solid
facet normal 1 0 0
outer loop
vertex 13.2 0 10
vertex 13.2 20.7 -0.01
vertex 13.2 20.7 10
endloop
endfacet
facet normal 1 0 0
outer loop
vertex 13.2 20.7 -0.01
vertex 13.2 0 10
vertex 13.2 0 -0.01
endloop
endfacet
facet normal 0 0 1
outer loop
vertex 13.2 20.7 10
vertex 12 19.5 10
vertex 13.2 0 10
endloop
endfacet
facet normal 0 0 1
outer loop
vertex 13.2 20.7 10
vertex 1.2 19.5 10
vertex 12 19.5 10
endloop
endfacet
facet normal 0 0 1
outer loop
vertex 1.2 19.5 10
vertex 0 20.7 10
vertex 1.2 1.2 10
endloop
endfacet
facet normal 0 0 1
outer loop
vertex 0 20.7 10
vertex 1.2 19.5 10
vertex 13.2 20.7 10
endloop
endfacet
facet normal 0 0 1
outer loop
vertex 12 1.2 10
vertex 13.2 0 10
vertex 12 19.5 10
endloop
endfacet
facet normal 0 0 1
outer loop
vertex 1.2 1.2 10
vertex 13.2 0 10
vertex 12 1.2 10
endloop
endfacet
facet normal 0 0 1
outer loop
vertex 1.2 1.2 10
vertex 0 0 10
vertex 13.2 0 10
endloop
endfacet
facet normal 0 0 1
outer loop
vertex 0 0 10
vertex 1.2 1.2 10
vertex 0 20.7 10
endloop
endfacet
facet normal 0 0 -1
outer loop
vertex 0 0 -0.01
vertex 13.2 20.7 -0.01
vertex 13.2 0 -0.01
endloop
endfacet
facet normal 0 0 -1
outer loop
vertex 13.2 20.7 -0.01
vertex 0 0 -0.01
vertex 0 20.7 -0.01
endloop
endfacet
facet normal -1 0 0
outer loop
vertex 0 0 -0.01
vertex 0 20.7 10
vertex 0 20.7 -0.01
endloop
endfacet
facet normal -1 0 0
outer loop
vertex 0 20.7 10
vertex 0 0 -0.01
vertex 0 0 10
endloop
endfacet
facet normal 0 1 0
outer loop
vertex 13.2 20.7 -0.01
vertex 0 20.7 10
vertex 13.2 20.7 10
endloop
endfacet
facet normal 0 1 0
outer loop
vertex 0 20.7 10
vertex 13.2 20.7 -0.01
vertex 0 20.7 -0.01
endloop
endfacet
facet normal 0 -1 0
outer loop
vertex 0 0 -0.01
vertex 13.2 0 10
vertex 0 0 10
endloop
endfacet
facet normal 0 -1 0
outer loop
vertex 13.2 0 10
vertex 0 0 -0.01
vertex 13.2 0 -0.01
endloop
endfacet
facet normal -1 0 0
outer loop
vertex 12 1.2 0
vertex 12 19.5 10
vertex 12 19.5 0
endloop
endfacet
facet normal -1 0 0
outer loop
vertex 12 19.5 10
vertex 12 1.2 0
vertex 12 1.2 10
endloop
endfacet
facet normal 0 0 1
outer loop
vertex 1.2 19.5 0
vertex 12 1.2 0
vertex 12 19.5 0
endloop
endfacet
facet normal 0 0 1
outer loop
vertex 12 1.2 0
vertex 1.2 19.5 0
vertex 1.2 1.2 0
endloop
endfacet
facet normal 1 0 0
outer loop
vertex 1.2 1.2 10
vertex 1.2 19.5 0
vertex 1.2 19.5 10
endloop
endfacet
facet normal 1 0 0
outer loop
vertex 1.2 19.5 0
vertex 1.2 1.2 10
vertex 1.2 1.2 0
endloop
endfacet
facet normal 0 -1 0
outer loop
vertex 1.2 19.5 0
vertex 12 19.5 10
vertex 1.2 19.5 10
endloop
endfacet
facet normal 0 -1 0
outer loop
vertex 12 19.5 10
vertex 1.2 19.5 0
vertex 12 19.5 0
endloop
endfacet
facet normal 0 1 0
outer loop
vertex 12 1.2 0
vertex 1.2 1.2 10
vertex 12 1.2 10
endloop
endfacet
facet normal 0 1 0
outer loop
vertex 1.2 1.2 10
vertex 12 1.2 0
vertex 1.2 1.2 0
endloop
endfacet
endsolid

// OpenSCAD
// file: ../Base/Boxes.scad
// Fischertechnik Box Foundation
// Pre-designed Boxes

use <Constants.scad>

include <PlacementOptions.scad>

box190Width = 190;
box190Depth = 130;
box130Width = 130;
box130Depth = 95;

// Values are from an original ec3 box
topBottomDifference = 1.5;
outerHeight = 40;
innerHeight = 38.2;
baseThickness = outerHeight - innerHeight;
stackExcess = 5.7;
radius = 3.5;
wallThickness = 1.5;
tolerance = 0.2;
stackOffset = innerHeight - stackExcess;

boxUsageHeight = stackOffset;
boxWallThickness = wallThickness;
boxBaseThickness = baseThickness;
boxWebWidth = 3.0;

// getBoxWallThickness()
// Gets the wall thickness of a Fischertechnik Box
function getBoxWallThickness() = boxWallThickness;

// getBoxUsageHeight()
// Gets the usable height of a Fischertechnik box
function getBoxUsageHeight() = boxUsageHeight;

// getBoxInnerHeight()
// Gets the inner height of a Fischertechnik box, including the stack excess
function getBoxInnerHeight() = innerHeight;

// getBoxBaseThickness()
// Gets the thickness of the Fischertechnik box base.
function getBoxBaseThickness() = boxBaseThickness;

// getBoxWebWidth()
// Gets the width of a box web
function getBoxWebWidth() = boxWebWidth;

// getBox190Space()
// Gets the usable inner space of a Box 190 as an x/y-list
function getBox190Space() = [
    box190Width - 2*getBoxWallThickness() - topBottomDifference, 
    box190Depth - 2*getBoxWallThickness() - topBottomDifference ];

// BoxBase(width, depth)
// Creates an empty stackable Fischertechnik compatible box
// width = Outer width of the box (190, 130, ...)
// depth = Outer depth of the box (130, 95, ...)

module BoxBase(width, depth, height=outerHeight) {    
    thinPlate = 0.01;

    innerHeight = height - baseThickness;    
    
    module BodyPlate(width, depth) {
        translate([radius, radius])
        hull() {
            w = width-2*radius;
            d = depth-2*radius;
            cube([w, d, thinPlate]);
            cylinder(thinPlate, r=radius, $fn=getFragments());
            translate([w, 0])
                cylinder(thinPlate, r=radius, $fn=getFragments());
            translate([w, d])
                cylinder(thinPlate, r=radius, $fn=getFragments());
            translate([0, d])
                cylinder(thinPlate, r=radius, $fn=getFragments());
        }
    }
    
    module Body(tolerance=tolerance) {
        hull() {
            // Bottom with tolerance to fit into the original boxes when stacked
            translate([-wallThickness+tolerance, -wallThickness+tolerance, -baseThickness])
                BodyPlate(width-topBottomDifference-2*tolerance, depth-topBottomDifference-2*tolerance);
            
            // Top
            translate([-wallThickness-topBottomDifference/2, -wallThickness-topBottomDifference/2, innerHeight-thinPlate])
                BodyPlate(width, depth);
         }
    }

    module Cutoff() {
        hull() {
            coWidth = width - 2*wallThickness;
            coDepth = depth - 2*wallThickness;
            
            // Bottom
            BodyPlate(coWidth-topBottomDifference, coDepth-topBottomDifference);

            // Top
            translate([-topBottomDifference/2, -topBottomDifference/2, innerHeight+thinPlate]) 
                BodyPlate(coWidth, coDepth);
        }
    }
    
    difference() {        
        Body();
        Cutoff();
        stackOffset = innerHeight - stackExcess;
        translate([0, 0, stackOffset + baseThickness])
            Body(tolerance=0);
    }
}

// Creates the Fischertechnik empty box 130x190 mm and places it at position 0,0
// 190x130 are the outer sizes, the inner space is slightly smaller. Use getBox190Space() to get the inner sizes.
// The box is positioned that the usable inner space is at the 0,0,0 position. The

module Box190() {
    BoxBase(box190Width, box190Depth);
}

// Gets the usable inner space of a Box 130 as an x/y-list
function getBox130Space() = [
    box130Width - 2*getBoxWallThickness() - topBottomDifference, 
    box130Depth - 2*getBoxWallThickness() - topBottomDifference ];

// Creates the Fischertechnik empty box 95x130 mm and places it at position 0,0
// 190x130 are the outer sizes, the inner space is slightly smaller. Use getBox190Space() to get the inner sizes.
// The box is positioned that the usable inner space is at the 0,0,0 position. The

module Box130() {
    BoxBase(box130Width, box130Depth);
}

// Creates a web at the specified box walls
// corner 0 = LowerLeft, 1 = UpperLeft, 2 = UpperRight, 3 = LowerRight
// side 0 = LeftOfCorner, 1 = RightOfCorner
// distance = Distance in mm from the corner
// boxSpace = inner width and depth of the box (default: Box 190)
// webWidth = length of the web (default is 3 mms)
// webThickness = thickness of the web (default is 1 mm)

module BoxWeb(corner, side, distance, boxSpace=getBox190Space(), webWidth=getBoxWebWidth(), webThickness=1.0) {
    sink = getBoxWallThickness()/2;

    width = (corner % 2 == 0) ? 
            (side == LeftOfCorner ? webWidth : webThickness) :
            (side == LeftOfCorner ? webThickness : webWidth);

    depth = (corner % 2 == 0) ? 
            (side == RightOfCorner ? webWidth : webThickness) :
            (side == RightOfCorner ? webThickness : webWidth);
    
    xDiff = corner == LowerLeft ? 
                (side == LeftOfCorner ? -sink : distance) :
            (corner == UpperLeft ?                
                (side == LeftOfCorner ? distance : -sink) :
            (corner == UpperRight ?
                (side == LeftOfCorner ? boxSpace.x-webWidth+sink : boxSpace.x-distance-webThickness) :
                (side == LeftOfCorner ? boxSpace.x-distance-webThickness: boxSpace.x-webWidth+sink)));

    yDiff = corner == LowerLeft ? 
                (side == RightOfCorner ? -sink : distance) :
            (corner == UpperLeft ?
                (side == RightOfCorner ? boxSpace.y-distance : boxSpace.y-webWidth+sink) :
            (corner == UpperRight ?
                (side == RightOfCorner ? boxSpace.y-webWidth+sink : boxSpace.y-distance) :
                (side == RightOfCorner ? distance : -sink)));
    
    translate([xDiff, yDiff, -getExcess()])
        cube([width, depth, boxUsageHeight + 2*getExcess()]);
}
// file: ../Base/Rotation.scad
// Fischertechnik Box Foundation
// Geometry Helpers Rotation

include <PlacementOptions.scad>

// getRotatedSpace(space, rotation=NoRotation)
// Rotates the space dependent on the specified rotation

function getRotatedSpace(space, rotation=NoRotation) = [
    (rotation == Rotate90 || rotation == Rotate270) ? space.y : space.x,
    (rotation == Rotate90 || rotation == Rotate270) ? space.x : space.y
];

// Rotates the given space around the fixed left lower corner
// space = the space the children needs as width/depth list [width,depth]
// rotation = 0 Rotate0 degrees, 1 Rotate90 degrees, 2 Rotate180 degrees, 3 Rotate270 degrees (equivalent to -90)

module RotateFix(space, rotation=NoRotation) {
    dy = (rotation == Rotate0 || rotation == Rotate270) ? 0 :
        (rotation == Rotate90) ? space.x :
        space.y;
    dx = (rotation < Rotate180) ? 0 :
        (rotation == Rotate180) ? space.x :
        space.y;
    
    translate([dx, dy, 0])
        rotate([0, 0, rotations[rotation]])
            children();
}
// file: ../Base/Alignment.scad
// Fischertechnik Box Foundation
// Geometry Helpers Alignment

include <PlacementOptions.scad>

// getAlignedX(elementWidth, spaceWidth, align=AlignRight, offset=0)
// Gets the aligned X offset of an element with the given
// width in the given space.
// elementWidth = The width of the element to positon
// spaceWidth = The space where the element should be aligned
// align = 0 AlignLeft, 1 AlignCenter, 2 AlignRight
// offset = an optional offset from the aligned position. When
// aligned left or centered, then positive values are in X direction.
// When aligned right then positive values are in negative X direction.

function getAlignedX(elementWidth, spaceWidth, align=AlignRight, offset=0) =
    (align == AlignLeft) ?
        offset :
        ((align == AlignCenter) ?
        (spaceWidth - elementWidth)/2 + offset :
        spaceWidth - offset - elementWidth);

// getAlignedY(elementDepth, spaceDepth, align=AlignTop, offset=0)
// Gets the aligned Y offset of an element with the given
// depth in the given space.
// elementDepth = The depth of the element to positon
// spaceDepth = The space where the element should be aligned
// align = 0 AlignBottom, 1 AlignCenter, 2 AlignTop
// offset = an optional offset from the aligned position. When
// aligned bottom or centered, then positive values are in Y direction.
// When aligned top then positive values are in negative Y direction.

function getAlignedY(elementDepth, spaceDepth, align=AlignTop, offset=0) =
    (align == AlignBottom) ?
        offset :
        ((align == AlignCenter) ?
        (spaceDepth - elementDepth)/2 + offset :
        spaceDepth - offset - elementDepth);
// file: ../Base/Placement.scad
// Fischertechnik Box Foundation
// Geometry Helpers Placement

use <Constants.scad>
use <Alignment.scad>
use <Rotation.scad>
use <Boxes.scad>

include <PlacementOptions.scad>

// Place(x=0, y=0, elementSpace=[0,0], alignX=AlignLeft, alignY=AlignBottom, rotation=Rotate0, boxSpace=getBox190Space())
// Places the child at the specified position
// y = Y-Position. This is a relative position when an X aligment is specified.
// x = X-Position. This is a relative position when an Y aligment is specified.
// elementSpace = space of the element to be placed [x,y]
// alignX = -1=NoAlign, 0 AlignLeft, 1 AlignCenter, 3 AlignRight (elementSpace and boxSpace required!)
// alignY = -1=NoAlign, 2 AlignBottom, 1 AlignCenter, 4 AlignTop (elementSpace and boxSpace required!)
// rotation = 0 Rotate0 0 degrees, 1 Rotate90 90 degrees, 
// 2 Rotate180 180 degrees, 3 Rotate270 270 degrees (equivalent to -90)
// boxSpace = Inner space of the box where the placement occurs [x,y] - default is Box 190x130 inner space

module Place(x=0, y=0, elementSpace=[0,0], 
  alignX=AlignLeft, alignY=AlignBottom, 
  rotation=NoRotation, boxSpace=getBox190Space()) {

    module Position(x, y, space, rotation=Rotate0) {
        translate([x, y, 0])
            RotateFix(space, rotation)
                children();
    }

    space = getRotatedSpace(elementSpace, rotation);
    alignedX = getAlignedX(space.x, boxSpace.x, alignX, x);
    alignedY = getAlignedY(space.y, boxSpace.y, alignY, y);
    Position(alignedX, alignedY, elementSpace, rotation)
        children();
}

// Center(space=getBox130Space(), elementSpace=[0,0])
// space = Space where the children is centered. For cylinder use centered=true and no elementSpace.
// elementSpace = space of the element to be centered [x,y]

module Center(space=getBox190Space(), elementSpace=[0,0]) {
    Place(elementSpace=elementSpace, boxSpace=space, alignX=AlignCenter, alignY=AlignCenter)
        children();
}

// CenterHorizontal(width=0, y=0, offset=0, space=getBox130Space())
// width = Width of the element to be placed.
// y = Y position of the element
// offset = Offset from the center position (negative will be left of the center)
// space = Space where the element is placed

module CenterHorizontal(width=0, y=0, offset=0, space=getBox190Space()) {
    Place(x=offset, y=y, elementSpace=[width, 0], boxSpace=space, alignX=AlignCenter)
        children(0);
}

// CenterVertical(depth=0, x=0, offset=0, space=getBox130Space())
// depth = Depth of the element to be placed.
// x = X position of the element
// offset = Offset from the center position (negative will be down of the center)
// space = Space where the element is placed

module CenterVertical(depth=0, x=0, offset=0, space=getBox190Space()) {
    Place(x=x, y=offset, elementSpace=[0, depth], boxSpace=space, alignY=AlignCenter)
        children(0);
}

// getIsVertical(align)
// True if the specified alignment needs a vertical orientation for a divider (AlignRight, AlignLeft)

function getIsVertical(align) = (align == AlignRight || align == AlignLeft);

// getIsHorizontal(align)
// True if the specified alignment needs a horizontal orientation for a divider (AlignTop, AlignBottom)

function getIsHorizontal(align) = (align == AlignTop || align == AlignBottom);
// file: ../Base/Helper.scad
// Fischertechnik Box Foundation
// Helper functions

include <PlacementOptions.scad>

// getRotation(rotations, i)
// gets the rotation with index i, even if rotations or rotations[i] is undefined.
// If undefined, NoRotation ist returned.
// rotations = list of Rotate-constants
// i = Index of the rotation
function getRotation(rotations, i) = (is_undef(rotations) || is_undef(rotations[i])) ? NoRotation : rotations[i];
// file: ../Base/PlacementOptions.scad
// Fischertechnik Box Foundation
// Placement Options

// Alignment
NoAlign = 0;
AlignLeft = 1;
AlignBottom = 2;
AlignCenter = 3;
AlignRight = 4;
AlignTop = 5;

// Element rotation degree steps
rotations = [0, -90, -180, -270];

// Rotation
NoRotation = 0;
Rotate0 = 0;
Rotate90 = 1;
Rotate180 = 2;
Rotate270 = 3;

// Docking (seen from above)
NoDock = -1;
DockLeft = 0;
DockTop = 1;
DockRight = 2;
DockCorner = 2;
DockBottom = 3;

// Web corners
LowerLeft = 0;
UpperLeft = 1;
UpperRight = 2;
LowerRight = 3;

// Web position relative to corner
LeftOfCorner = 0;
RightOfCorner = 1;
// file: ../Base/Constants.scad
// Fischertechnik Box Foundation
// Constants

// Constant values necessary for multiple elements

// Base constants
dividerThickness = 1.2;
excess = 0.01;
fragments = 90;
tolerance = 0.8;

// Gets the thickness of a divider 
function getDividerThickness() = dividerThickness;

// Gets the excess that is used to merge walls into each other
function getExcess() = excess;

// Gets amount of fragments of a cylinder
function getFragments() = fragments;

// Gets the inner tolerance of a frame to each side
function getTolerance() = tolerance;


// Fischertechnik specific constants
axisDiameter = 4;
axisBottomDiameter = axisDiameter + 1;
standardEdgeDistance = 2.5;
standardWebDistance = 11.5;
standardCornerLength = 15;
tubeWallFactor = 0.8;
smallPartsFrameHeight = 20;

// Gets axis diameter
function getAxisDiameter() = axisDiameter;

// Gets axis bottom diameter for thicker part at the bottom
function getAxisBottomDiameter() = axisBottomDiameter;

// gets the standard distance to the wall of the box for dockable frames with webs
function getStandardEdgeDistance() = standardEdgeDistance;

// gets the standard distance of each web to the corner of the dockable frame
function getStandardWebDistance() = standardWebDistance;

// gets the standard length of the corner walls of a dockable frame
function getStandardCornerLength() = standardCornerLength;

// gets the wall thickness of a tube.
function getTubeWallThickness() = tubeWallFactor * getDividerThickness();

// gets the frame height for docked small parts boxes.
function getSmallPartsFrameHeight() = smallPartsFrameHeight;
// main file
// Fischertechnik Box Library
// Frame for Angle Block 10x15x15
// 38423

use <../Base/Constants.scad>
use <../Base/Deployment.scad>
use <../ModelBase/Simple.scad>

include <../Base/PlacementOptions.scad>

/* [Element Parameters] */
count = 1;

/* [Hidden] */
width = 10;
depth = 17.5;

// getFrameAngleBlock10x15x15Space
// Gets the space the count of frame angle blocks needs as width and depth (.x and .y as a list)

function getFrameAngleBlock10x15x15Space(count=1) = [
    (width + getTolerance())*count + (count+1)*getDividerThickness(),
    depth + getTolerance() + 2*getDividerThickness()];

// FrameAngleBlock10x15x15()
// Frame for angle block 10x15x15
// 38423

module FrameAngleBlock10x15x15(count=1) {
    height = 10;

    Merge(count, getFrameOuterVolume([width, depth, height]), NoRotation)
        Frame([width, depth, height]);
}

// Test
color("lightgray")
FrameAngleBlock10x15x15(count);
